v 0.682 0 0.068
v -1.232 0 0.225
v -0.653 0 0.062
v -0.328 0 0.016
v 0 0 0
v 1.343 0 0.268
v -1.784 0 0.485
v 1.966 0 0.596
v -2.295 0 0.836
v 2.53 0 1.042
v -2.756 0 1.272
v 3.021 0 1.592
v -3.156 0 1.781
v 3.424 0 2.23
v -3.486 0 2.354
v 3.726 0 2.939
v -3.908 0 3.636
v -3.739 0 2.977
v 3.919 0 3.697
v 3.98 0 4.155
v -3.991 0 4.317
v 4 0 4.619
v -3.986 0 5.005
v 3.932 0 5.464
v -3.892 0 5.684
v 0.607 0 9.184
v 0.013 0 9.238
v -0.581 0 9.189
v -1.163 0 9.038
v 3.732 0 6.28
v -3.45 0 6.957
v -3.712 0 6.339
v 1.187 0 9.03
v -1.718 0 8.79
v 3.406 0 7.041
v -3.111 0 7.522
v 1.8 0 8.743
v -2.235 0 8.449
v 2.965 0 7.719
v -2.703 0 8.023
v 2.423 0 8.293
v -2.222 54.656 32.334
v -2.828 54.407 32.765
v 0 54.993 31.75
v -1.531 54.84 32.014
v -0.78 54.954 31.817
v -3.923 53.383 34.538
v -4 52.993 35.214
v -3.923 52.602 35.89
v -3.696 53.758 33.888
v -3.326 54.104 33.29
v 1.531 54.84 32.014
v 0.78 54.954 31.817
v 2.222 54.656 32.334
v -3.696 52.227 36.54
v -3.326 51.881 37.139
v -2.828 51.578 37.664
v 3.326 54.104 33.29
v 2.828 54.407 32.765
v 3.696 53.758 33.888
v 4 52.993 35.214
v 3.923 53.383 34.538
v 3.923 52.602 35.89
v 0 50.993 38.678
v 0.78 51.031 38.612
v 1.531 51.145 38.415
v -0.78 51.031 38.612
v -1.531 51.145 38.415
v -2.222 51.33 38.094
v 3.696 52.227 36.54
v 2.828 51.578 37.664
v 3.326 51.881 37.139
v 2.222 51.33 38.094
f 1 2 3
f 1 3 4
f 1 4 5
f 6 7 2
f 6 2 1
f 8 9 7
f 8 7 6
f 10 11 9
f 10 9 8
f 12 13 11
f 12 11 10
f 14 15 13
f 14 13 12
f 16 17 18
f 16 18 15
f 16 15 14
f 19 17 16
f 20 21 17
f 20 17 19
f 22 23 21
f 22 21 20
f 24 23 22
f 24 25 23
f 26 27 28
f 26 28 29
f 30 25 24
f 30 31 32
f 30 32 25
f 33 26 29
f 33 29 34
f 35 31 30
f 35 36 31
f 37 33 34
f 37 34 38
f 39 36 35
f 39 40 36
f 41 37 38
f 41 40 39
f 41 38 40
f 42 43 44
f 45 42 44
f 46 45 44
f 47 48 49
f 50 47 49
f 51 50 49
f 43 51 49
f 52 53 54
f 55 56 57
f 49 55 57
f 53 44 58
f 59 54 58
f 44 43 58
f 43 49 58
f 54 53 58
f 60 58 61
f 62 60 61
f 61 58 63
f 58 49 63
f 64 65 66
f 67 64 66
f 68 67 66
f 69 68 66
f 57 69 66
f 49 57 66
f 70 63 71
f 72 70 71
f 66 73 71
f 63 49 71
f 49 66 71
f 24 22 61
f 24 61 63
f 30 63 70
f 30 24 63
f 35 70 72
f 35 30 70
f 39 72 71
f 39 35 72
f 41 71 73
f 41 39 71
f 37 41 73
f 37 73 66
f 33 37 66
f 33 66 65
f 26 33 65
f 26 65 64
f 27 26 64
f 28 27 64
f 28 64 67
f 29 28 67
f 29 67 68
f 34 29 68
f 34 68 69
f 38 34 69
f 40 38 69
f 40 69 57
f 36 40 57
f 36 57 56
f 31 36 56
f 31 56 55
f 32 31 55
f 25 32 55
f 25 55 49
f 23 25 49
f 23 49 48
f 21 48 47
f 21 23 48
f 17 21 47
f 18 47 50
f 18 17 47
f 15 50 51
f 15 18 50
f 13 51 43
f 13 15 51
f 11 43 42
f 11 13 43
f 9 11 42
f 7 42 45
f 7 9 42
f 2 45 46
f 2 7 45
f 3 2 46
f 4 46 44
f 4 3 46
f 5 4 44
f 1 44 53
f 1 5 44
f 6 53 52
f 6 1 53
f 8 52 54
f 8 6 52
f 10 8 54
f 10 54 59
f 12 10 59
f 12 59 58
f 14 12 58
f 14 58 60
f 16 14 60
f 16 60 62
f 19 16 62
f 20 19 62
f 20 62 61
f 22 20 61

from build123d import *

# Parameters (mm, degrees)
F0_R     = 4
F1_DEPTH = 63.5
F3_ANGLE = 30
F4_W     = 20
F4_H     = 20
F5_DEPTH = 4.001


with BuildPart() as f1:
    # F0 (on Front) → F1 (new body)
    with BuildSketch(Plane.XZ):
        with Locations((0, 4)):
            Circle(F0_R)
    extrude(amount=-F1_DEPTH)


with BuildPart() as f1_1:
    # F3: moved
    add(f1.part.rotate(Axis((2.8749, 0, 0), (1, 0, 0)), F3_ANGLE))

    # F4 (on Front) → F5 (cut, through all)
    with BuildSketch(Plane.XZ):
        Rectangle(F4_W, F4_H)
    extrude(amount=F5_DEPTH, mode=Mode.SUBTRACT)


solid = f1_1.part
